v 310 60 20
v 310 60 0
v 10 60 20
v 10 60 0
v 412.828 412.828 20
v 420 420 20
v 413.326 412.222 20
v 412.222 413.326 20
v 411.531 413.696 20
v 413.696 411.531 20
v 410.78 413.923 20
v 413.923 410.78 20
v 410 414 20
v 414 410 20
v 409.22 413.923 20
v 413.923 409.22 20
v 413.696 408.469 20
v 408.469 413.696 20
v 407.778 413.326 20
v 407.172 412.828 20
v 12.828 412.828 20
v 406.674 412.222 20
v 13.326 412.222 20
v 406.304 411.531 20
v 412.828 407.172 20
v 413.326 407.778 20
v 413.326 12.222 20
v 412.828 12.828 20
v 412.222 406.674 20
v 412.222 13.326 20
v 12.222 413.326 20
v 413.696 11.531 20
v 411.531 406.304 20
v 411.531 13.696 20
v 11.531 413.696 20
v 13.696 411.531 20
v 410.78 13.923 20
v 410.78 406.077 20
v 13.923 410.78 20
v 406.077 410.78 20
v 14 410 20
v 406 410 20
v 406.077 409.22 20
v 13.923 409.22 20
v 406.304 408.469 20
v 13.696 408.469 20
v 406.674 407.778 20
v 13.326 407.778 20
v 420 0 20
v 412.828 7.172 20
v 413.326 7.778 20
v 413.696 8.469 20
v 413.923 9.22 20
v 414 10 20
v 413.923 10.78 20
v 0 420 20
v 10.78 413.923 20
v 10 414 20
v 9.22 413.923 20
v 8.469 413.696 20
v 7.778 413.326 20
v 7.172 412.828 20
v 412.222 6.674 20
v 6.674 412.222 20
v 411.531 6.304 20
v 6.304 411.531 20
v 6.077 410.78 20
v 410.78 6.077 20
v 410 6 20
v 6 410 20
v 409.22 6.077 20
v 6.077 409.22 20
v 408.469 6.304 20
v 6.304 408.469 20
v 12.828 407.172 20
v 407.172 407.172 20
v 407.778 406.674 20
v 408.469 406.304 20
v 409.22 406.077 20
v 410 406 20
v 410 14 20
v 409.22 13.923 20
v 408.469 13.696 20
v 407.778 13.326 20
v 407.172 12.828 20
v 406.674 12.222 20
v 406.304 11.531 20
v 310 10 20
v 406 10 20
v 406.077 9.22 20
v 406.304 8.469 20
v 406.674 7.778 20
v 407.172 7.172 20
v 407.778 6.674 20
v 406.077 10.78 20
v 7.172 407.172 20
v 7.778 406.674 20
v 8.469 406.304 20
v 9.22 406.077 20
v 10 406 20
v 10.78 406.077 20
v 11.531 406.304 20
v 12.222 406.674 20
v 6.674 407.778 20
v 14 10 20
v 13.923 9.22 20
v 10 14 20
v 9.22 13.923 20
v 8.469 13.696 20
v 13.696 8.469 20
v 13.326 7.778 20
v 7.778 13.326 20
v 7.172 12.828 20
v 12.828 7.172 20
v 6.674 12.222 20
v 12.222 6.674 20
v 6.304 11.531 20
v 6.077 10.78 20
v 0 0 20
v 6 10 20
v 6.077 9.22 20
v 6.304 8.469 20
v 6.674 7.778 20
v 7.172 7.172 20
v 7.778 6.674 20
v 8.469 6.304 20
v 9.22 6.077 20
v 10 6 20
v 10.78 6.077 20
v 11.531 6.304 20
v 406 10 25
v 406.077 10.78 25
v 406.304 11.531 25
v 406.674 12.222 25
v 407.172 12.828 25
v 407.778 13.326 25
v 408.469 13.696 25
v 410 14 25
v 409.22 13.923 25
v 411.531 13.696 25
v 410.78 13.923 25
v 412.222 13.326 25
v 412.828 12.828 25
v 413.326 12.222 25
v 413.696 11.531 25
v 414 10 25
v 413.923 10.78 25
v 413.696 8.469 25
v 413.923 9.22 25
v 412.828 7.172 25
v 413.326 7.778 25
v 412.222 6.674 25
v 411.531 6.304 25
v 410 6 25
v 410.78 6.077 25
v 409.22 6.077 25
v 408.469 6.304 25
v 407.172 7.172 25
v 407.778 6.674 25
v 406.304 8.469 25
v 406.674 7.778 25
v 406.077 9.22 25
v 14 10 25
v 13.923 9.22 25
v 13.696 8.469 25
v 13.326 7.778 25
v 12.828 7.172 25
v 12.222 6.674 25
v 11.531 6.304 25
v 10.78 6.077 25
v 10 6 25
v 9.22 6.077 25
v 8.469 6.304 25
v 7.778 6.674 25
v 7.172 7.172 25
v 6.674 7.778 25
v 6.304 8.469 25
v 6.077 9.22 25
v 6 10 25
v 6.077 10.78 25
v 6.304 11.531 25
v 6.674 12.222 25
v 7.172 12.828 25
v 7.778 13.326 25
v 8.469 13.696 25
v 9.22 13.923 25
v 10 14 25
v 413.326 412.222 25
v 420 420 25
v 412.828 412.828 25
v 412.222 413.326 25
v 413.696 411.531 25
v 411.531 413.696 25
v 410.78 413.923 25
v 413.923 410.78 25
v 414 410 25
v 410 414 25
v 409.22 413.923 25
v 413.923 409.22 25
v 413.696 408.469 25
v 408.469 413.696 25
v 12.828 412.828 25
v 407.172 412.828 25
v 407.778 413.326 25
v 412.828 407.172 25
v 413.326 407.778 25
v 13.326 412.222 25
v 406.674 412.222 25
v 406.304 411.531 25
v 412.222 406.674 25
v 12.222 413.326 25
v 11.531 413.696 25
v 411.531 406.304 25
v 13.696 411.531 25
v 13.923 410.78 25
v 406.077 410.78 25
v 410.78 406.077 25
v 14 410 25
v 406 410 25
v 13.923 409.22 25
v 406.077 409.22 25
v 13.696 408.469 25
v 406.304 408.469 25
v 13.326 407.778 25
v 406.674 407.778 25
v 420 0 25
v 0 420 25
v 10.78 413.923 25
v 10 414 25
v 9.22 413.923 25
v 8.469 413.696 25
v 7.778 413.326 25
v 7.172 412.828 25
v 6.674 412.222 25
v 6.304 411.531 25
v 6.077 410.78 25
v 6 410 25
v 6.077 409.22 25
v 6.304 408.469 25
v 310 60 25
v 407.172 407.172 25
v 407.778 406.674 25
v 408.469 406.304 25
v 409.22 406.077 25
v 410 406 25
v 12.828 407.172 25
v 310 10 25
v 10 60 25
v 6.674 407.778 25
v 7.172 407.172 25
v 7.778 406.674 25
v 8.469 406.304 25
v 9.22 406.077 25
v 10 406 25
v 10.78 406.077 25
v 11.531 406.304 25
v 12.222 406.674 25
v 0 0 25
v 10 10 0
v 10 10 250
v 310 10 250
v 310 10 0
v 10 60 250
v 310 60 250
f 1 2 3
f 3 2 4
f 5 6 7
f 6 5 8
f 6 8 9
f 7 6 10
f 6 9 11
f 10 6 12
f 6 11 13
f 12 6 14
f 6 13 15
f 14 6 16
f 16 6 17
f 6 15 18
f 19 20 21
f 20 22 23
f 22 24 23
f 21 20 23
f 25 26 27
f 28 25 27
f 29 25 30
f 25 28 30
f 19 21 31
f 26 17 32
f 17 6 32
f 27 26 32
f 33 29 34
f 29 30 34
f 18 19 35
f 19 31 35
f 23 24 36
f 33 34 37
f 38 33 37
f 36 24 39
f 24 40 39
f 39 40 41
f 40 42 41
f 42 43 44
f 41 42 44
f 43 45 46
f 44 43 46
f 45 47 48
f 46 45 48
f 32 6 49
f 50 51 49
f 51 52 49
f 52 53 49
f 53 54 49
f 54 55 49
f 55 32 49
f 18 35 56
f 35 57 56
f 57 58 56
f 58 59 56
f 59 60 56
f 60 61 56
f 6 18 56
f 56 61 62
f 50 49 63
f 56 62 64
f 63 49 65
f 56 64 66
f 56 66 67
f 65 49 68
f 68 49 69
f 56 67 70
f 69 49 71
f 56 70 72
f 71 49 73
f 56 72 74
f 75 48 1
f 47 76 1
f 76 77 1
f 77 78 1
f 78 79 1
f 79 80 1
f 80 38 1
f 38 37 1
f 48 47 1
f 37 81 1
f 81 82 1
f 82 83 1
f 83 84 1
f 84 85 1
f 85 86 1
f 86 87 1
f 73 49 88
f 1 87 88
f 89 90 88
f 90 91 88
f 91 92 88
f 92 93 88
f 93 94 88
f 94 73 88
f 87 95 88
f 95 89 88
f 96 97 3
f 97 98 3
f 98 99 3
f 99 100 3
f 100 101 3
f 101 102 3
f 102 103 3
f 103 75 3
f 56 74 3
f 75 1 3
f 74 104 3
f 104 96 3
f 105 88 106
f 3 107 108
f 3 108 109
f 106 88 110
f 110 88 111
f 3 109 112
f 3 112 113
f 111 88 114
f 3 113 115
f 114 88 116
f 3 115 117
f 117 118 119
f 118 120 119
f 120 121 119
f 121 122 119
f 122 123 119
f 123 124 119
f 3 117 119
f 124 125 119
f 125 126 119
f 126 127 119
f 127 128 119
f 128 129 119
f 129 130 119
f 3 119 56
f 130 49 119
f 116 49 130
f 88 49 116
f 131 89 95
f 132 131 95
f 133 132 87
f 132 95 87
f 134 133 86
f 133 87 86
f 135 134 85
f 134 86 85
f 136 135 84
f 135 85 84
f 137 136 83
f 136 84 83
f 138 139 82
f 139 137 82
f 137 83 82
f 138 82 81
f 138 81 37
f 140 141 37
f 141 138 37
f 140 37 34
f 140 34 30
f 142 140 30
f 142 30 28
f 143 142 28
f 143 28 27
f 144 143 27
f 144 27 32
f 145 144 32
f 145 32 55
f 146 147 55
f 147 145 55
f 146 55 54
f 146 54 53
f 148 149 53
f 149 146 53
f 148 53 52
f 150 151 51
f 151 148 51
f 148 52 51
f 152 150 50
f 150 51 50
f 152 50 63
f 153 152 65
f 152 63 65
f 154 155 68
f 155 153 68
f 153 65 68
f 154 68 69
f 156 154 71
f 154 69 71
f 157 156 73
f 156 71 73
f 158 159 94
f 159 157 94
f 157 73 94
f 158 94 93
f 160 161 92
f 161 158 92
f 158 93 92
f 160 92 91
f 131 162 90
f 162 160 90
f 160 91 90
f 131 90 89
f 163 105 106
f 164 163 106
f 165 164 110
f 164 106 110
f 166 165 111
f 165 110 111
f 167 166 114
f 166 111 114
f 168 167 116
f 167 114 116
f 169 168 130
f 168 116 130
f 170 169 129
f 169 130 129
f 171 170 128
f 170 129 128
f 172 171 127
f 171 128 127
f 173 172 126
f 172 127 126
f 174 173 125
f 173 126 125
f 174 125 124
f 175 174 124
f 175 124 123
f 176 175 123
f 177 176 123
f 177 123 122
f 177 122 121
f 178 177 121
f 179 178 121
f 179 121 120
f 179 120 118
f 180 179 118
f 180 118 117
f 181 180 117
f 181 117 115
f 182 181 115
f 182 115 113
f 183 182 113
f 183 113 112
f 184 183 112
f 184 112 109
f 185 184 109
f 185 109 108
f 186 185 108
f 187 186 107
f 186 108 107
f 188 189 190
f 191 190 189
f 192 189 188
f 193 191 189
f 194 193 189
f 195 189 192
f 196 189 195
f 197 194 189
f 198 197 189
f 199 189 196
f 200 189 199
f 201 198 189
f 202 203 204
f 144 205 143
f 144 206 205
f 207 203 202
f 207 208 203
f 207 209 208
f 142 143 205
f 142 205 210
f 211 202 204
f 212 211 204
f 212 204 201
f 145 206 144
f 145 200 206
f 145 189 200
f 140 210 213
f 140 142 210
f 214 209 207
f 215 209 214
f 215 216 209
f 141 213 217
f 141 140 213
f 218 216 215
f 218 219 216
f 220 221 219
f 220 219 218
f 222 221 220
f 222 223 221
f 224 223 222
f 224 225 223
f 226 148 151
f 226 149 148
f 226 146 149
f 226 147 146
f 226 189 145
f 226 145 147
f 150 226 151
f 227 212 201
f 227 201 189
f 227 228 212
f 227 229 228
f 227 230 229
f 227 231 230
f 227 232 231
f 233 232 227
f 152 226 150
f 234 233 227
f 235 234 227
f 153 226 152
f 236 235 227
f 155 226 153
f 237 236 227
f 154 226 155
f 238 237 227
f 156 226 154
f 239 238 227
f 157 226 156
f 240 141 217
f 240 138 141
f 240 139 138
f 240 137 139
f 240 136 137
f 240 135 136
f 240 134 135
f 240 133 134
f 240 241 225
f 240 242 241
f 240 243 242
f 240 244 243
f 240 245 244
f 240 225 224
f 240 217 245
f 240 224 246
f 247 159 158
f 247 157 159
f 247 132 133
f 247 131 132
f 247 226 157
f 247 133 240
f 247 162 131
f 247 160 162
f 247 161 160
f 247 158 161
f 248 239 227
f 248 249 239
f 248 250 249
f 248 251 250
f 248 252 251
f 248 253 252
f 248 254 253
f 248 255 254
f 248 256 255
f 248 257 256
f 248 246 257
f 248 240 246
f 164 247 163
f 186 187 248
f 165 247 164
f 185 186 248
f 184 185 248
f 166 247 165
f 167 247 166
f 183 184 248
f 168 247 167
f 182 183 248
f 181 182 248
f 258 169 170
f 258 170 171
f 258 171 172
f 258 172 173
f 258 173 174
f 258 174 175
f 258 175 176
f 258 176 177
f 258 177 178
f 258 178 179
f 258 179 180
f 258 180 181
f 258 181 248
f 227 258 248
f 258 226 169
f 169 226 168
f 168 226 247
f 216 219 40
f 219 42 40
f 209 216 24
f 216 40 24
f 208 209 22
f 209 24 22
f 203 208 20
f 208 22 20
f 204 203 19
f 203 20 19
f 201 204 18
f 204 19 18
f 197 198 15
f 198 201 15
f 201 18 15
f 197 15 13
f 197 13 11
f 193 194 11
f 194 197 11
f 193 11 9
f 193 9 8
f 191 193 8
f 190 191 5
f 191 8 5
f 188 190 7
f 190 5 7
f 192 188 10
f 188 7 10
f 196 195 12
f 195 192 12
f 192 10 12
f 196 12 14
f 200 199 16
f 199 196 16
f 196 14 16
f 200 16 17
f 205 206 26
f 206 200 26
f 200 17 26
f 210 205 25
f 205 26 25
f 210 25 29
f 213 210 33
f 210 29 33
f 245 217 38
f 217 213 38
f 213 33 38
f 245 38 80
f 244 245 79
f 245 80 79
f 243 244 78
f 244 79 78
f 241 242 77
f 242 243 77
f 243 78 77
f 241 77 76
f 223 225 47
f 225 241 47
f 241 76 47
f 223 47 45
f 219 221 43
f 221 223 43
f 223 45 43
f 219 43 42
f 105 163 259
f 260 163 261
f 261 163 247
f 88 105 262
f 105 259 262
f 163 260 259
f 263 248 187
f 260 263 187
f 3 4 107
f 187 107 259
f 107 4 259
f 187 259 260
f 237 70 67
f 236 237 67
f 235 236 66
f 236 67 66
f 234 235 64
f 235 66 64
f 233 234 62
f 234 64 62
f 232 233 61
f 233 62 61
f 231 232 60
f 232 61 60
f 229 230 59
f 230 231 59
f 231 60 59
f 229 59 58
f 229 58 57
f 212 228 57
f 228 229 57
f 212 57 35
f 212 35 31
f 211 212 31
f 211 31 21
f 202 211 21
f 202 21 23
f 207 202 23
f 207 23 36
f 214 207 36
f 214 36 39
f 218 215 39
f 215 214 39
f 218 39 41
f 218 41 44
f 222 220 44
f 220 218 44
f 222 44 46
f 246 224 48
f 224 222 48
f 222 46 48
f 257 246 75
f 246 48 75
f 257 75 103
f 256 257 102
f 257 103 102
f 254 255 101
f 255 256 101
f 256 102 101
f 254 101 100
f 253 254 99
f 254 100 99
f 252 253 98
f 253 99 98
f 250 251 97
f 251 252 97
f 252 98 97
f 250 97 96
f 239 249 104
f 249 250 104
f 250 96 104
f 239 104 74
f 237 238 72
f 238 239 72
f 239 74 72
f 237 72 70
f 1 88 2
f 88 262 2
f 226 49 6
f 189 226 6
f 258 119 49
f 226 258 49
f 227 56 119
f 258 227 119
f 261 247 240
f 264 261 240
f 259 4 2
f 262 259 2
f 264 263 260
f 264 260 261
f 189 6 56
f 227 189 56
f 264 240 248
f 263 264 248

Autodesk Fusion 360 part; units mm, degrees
sketch "Sketch1" plane through (0, 0, 0) normal (0, 0, 1) x (1, 0, 0)
  circle A0 centre (0, 0) radius 2.4955
  dimension "d1" = 4.991
extrude "Extrude1" add sketch "Sketch1" along normal blind 250
thread "Thread1"

Autodesk Fusion 360 part; units mm, degrees
sketch "Sketch1" plane through (0, 0, 0) normal (0, 0, 1) x (1, 0, 0)
  circle A0 centre (10, 10) radius 2.4955
  circle A1 centre (10, 10) radius 5
  dimension "d1" = 4.991
  dimension "d2" = 10
extrude "Extrude1" add sketch "Sketch1" along normal blind 10

Autodesk Fusion 360 part; units mm, degrees
sketch "Sketch1" plane through (0, 0, 0) normal (0, 0, 1) x (1, 0, 0)
  line L0 (0, 0) -> (350, 0)
  line L1 (350, 0) -> (350, 350)
  line L2 (350, 350) -> (0, 350)
  line L3 (0, 350) -> (0, 0)
  line L4 (-10, 0) -> (-10, -10)
  line L5 (-10, -10) -> (360, -10)
  line L6 (360, -10) -> (360, 360)
  line L7 (360, 360) -> (-10, 360)
  line L8 (-10, 360) -> (-10, -10)
  dimension "d1" = 350
  dimension "d2" = 350
  dimension "d3" = 10
  dimension "d4" = 370
  dimension "d5" = 370
extrude "Extrude1" add sketch "Sketch1" along normal blind 75
sketch "Sketch2" plane through (0, 0, 0) normal (0, 0, 1) x (1, 0, 0)
  line L0 (0, 350) -> (350, 350)
  line L1 (350, 350) -> (350, 0)
  line L2 (350, 0) -> (0, 0)
  line L3 (0, 0) -> (0, 350)
extrude "Extrude2" add sketch "Sketch2" along normal blind 5

Autodesk Fusion 360 part; units mm, degrees
sketch "Sketch1" plane through (0, 0, 0) normal (0, 0, 1) x (1, 0, 0)
  line L0 (0, 0) -> (420, 0)
  line L1 (420, 0) -> (420, 420)
  line L2 (420, 420) -> (0, 420)
  line L3 (0, 420) -> (0, 0)
  dimension "d1" = 420
  dimension "d2" = 420
extrude "Extrude1" add sketch "Sketch1" along normal blind 20
sketch "Sketch2" plane through (0, 0, 20) normal (0, 0, 1) x (-1, 0, 0)
  line L0 (0, -420) -> (0, 0)
  line L1 (0, 0) -> (-420, 0)
  line L2 (-420, 0) -> (-420, -420)
  line L3 (-420, -420) -> (0, -420)
  circle A0 centre (-410, -410) radius 4
  circle A1 centre (-10, -410) radius 4
  circle A2 centre (-410, -10) radius 4
  circle A3 centre (-10, -10) radius 4
  dimension "d7" = 400
  dimension "d8" = 8
  dimension "d9" = 8
  dimension "d10" = 400
  dimension "d11" = 400
  dimension "d12" = 8
  dimension "d13" = 8
extrude "Extrude2" cut sketch "Sketch2" against normal blind 100 contours A0 | A1 | A2 | A3
extrude "Extrude3" cut 1 faces at (144.2065, 144.341, 20) along direction (0, 0, -1) blind 10

Autodesk Fusion 360 part; units mm, degrees
sketch "Sketch1" plane through (0, 0, 0) normal (0, 0, 1) x (1, 0, 0)
  line L0 (10, 10) -> (310, 10)
  line L1 (310, 10) -> (310, 60)
  line L2 (310, 60) -> (10, 60)
  line L3 (10, 60) -> (10, 10)
  dimension "d1" = 300
  dimension "d2" = 50
extrude "Extrude1" add sketch "Sketch1" along normal blind 20
